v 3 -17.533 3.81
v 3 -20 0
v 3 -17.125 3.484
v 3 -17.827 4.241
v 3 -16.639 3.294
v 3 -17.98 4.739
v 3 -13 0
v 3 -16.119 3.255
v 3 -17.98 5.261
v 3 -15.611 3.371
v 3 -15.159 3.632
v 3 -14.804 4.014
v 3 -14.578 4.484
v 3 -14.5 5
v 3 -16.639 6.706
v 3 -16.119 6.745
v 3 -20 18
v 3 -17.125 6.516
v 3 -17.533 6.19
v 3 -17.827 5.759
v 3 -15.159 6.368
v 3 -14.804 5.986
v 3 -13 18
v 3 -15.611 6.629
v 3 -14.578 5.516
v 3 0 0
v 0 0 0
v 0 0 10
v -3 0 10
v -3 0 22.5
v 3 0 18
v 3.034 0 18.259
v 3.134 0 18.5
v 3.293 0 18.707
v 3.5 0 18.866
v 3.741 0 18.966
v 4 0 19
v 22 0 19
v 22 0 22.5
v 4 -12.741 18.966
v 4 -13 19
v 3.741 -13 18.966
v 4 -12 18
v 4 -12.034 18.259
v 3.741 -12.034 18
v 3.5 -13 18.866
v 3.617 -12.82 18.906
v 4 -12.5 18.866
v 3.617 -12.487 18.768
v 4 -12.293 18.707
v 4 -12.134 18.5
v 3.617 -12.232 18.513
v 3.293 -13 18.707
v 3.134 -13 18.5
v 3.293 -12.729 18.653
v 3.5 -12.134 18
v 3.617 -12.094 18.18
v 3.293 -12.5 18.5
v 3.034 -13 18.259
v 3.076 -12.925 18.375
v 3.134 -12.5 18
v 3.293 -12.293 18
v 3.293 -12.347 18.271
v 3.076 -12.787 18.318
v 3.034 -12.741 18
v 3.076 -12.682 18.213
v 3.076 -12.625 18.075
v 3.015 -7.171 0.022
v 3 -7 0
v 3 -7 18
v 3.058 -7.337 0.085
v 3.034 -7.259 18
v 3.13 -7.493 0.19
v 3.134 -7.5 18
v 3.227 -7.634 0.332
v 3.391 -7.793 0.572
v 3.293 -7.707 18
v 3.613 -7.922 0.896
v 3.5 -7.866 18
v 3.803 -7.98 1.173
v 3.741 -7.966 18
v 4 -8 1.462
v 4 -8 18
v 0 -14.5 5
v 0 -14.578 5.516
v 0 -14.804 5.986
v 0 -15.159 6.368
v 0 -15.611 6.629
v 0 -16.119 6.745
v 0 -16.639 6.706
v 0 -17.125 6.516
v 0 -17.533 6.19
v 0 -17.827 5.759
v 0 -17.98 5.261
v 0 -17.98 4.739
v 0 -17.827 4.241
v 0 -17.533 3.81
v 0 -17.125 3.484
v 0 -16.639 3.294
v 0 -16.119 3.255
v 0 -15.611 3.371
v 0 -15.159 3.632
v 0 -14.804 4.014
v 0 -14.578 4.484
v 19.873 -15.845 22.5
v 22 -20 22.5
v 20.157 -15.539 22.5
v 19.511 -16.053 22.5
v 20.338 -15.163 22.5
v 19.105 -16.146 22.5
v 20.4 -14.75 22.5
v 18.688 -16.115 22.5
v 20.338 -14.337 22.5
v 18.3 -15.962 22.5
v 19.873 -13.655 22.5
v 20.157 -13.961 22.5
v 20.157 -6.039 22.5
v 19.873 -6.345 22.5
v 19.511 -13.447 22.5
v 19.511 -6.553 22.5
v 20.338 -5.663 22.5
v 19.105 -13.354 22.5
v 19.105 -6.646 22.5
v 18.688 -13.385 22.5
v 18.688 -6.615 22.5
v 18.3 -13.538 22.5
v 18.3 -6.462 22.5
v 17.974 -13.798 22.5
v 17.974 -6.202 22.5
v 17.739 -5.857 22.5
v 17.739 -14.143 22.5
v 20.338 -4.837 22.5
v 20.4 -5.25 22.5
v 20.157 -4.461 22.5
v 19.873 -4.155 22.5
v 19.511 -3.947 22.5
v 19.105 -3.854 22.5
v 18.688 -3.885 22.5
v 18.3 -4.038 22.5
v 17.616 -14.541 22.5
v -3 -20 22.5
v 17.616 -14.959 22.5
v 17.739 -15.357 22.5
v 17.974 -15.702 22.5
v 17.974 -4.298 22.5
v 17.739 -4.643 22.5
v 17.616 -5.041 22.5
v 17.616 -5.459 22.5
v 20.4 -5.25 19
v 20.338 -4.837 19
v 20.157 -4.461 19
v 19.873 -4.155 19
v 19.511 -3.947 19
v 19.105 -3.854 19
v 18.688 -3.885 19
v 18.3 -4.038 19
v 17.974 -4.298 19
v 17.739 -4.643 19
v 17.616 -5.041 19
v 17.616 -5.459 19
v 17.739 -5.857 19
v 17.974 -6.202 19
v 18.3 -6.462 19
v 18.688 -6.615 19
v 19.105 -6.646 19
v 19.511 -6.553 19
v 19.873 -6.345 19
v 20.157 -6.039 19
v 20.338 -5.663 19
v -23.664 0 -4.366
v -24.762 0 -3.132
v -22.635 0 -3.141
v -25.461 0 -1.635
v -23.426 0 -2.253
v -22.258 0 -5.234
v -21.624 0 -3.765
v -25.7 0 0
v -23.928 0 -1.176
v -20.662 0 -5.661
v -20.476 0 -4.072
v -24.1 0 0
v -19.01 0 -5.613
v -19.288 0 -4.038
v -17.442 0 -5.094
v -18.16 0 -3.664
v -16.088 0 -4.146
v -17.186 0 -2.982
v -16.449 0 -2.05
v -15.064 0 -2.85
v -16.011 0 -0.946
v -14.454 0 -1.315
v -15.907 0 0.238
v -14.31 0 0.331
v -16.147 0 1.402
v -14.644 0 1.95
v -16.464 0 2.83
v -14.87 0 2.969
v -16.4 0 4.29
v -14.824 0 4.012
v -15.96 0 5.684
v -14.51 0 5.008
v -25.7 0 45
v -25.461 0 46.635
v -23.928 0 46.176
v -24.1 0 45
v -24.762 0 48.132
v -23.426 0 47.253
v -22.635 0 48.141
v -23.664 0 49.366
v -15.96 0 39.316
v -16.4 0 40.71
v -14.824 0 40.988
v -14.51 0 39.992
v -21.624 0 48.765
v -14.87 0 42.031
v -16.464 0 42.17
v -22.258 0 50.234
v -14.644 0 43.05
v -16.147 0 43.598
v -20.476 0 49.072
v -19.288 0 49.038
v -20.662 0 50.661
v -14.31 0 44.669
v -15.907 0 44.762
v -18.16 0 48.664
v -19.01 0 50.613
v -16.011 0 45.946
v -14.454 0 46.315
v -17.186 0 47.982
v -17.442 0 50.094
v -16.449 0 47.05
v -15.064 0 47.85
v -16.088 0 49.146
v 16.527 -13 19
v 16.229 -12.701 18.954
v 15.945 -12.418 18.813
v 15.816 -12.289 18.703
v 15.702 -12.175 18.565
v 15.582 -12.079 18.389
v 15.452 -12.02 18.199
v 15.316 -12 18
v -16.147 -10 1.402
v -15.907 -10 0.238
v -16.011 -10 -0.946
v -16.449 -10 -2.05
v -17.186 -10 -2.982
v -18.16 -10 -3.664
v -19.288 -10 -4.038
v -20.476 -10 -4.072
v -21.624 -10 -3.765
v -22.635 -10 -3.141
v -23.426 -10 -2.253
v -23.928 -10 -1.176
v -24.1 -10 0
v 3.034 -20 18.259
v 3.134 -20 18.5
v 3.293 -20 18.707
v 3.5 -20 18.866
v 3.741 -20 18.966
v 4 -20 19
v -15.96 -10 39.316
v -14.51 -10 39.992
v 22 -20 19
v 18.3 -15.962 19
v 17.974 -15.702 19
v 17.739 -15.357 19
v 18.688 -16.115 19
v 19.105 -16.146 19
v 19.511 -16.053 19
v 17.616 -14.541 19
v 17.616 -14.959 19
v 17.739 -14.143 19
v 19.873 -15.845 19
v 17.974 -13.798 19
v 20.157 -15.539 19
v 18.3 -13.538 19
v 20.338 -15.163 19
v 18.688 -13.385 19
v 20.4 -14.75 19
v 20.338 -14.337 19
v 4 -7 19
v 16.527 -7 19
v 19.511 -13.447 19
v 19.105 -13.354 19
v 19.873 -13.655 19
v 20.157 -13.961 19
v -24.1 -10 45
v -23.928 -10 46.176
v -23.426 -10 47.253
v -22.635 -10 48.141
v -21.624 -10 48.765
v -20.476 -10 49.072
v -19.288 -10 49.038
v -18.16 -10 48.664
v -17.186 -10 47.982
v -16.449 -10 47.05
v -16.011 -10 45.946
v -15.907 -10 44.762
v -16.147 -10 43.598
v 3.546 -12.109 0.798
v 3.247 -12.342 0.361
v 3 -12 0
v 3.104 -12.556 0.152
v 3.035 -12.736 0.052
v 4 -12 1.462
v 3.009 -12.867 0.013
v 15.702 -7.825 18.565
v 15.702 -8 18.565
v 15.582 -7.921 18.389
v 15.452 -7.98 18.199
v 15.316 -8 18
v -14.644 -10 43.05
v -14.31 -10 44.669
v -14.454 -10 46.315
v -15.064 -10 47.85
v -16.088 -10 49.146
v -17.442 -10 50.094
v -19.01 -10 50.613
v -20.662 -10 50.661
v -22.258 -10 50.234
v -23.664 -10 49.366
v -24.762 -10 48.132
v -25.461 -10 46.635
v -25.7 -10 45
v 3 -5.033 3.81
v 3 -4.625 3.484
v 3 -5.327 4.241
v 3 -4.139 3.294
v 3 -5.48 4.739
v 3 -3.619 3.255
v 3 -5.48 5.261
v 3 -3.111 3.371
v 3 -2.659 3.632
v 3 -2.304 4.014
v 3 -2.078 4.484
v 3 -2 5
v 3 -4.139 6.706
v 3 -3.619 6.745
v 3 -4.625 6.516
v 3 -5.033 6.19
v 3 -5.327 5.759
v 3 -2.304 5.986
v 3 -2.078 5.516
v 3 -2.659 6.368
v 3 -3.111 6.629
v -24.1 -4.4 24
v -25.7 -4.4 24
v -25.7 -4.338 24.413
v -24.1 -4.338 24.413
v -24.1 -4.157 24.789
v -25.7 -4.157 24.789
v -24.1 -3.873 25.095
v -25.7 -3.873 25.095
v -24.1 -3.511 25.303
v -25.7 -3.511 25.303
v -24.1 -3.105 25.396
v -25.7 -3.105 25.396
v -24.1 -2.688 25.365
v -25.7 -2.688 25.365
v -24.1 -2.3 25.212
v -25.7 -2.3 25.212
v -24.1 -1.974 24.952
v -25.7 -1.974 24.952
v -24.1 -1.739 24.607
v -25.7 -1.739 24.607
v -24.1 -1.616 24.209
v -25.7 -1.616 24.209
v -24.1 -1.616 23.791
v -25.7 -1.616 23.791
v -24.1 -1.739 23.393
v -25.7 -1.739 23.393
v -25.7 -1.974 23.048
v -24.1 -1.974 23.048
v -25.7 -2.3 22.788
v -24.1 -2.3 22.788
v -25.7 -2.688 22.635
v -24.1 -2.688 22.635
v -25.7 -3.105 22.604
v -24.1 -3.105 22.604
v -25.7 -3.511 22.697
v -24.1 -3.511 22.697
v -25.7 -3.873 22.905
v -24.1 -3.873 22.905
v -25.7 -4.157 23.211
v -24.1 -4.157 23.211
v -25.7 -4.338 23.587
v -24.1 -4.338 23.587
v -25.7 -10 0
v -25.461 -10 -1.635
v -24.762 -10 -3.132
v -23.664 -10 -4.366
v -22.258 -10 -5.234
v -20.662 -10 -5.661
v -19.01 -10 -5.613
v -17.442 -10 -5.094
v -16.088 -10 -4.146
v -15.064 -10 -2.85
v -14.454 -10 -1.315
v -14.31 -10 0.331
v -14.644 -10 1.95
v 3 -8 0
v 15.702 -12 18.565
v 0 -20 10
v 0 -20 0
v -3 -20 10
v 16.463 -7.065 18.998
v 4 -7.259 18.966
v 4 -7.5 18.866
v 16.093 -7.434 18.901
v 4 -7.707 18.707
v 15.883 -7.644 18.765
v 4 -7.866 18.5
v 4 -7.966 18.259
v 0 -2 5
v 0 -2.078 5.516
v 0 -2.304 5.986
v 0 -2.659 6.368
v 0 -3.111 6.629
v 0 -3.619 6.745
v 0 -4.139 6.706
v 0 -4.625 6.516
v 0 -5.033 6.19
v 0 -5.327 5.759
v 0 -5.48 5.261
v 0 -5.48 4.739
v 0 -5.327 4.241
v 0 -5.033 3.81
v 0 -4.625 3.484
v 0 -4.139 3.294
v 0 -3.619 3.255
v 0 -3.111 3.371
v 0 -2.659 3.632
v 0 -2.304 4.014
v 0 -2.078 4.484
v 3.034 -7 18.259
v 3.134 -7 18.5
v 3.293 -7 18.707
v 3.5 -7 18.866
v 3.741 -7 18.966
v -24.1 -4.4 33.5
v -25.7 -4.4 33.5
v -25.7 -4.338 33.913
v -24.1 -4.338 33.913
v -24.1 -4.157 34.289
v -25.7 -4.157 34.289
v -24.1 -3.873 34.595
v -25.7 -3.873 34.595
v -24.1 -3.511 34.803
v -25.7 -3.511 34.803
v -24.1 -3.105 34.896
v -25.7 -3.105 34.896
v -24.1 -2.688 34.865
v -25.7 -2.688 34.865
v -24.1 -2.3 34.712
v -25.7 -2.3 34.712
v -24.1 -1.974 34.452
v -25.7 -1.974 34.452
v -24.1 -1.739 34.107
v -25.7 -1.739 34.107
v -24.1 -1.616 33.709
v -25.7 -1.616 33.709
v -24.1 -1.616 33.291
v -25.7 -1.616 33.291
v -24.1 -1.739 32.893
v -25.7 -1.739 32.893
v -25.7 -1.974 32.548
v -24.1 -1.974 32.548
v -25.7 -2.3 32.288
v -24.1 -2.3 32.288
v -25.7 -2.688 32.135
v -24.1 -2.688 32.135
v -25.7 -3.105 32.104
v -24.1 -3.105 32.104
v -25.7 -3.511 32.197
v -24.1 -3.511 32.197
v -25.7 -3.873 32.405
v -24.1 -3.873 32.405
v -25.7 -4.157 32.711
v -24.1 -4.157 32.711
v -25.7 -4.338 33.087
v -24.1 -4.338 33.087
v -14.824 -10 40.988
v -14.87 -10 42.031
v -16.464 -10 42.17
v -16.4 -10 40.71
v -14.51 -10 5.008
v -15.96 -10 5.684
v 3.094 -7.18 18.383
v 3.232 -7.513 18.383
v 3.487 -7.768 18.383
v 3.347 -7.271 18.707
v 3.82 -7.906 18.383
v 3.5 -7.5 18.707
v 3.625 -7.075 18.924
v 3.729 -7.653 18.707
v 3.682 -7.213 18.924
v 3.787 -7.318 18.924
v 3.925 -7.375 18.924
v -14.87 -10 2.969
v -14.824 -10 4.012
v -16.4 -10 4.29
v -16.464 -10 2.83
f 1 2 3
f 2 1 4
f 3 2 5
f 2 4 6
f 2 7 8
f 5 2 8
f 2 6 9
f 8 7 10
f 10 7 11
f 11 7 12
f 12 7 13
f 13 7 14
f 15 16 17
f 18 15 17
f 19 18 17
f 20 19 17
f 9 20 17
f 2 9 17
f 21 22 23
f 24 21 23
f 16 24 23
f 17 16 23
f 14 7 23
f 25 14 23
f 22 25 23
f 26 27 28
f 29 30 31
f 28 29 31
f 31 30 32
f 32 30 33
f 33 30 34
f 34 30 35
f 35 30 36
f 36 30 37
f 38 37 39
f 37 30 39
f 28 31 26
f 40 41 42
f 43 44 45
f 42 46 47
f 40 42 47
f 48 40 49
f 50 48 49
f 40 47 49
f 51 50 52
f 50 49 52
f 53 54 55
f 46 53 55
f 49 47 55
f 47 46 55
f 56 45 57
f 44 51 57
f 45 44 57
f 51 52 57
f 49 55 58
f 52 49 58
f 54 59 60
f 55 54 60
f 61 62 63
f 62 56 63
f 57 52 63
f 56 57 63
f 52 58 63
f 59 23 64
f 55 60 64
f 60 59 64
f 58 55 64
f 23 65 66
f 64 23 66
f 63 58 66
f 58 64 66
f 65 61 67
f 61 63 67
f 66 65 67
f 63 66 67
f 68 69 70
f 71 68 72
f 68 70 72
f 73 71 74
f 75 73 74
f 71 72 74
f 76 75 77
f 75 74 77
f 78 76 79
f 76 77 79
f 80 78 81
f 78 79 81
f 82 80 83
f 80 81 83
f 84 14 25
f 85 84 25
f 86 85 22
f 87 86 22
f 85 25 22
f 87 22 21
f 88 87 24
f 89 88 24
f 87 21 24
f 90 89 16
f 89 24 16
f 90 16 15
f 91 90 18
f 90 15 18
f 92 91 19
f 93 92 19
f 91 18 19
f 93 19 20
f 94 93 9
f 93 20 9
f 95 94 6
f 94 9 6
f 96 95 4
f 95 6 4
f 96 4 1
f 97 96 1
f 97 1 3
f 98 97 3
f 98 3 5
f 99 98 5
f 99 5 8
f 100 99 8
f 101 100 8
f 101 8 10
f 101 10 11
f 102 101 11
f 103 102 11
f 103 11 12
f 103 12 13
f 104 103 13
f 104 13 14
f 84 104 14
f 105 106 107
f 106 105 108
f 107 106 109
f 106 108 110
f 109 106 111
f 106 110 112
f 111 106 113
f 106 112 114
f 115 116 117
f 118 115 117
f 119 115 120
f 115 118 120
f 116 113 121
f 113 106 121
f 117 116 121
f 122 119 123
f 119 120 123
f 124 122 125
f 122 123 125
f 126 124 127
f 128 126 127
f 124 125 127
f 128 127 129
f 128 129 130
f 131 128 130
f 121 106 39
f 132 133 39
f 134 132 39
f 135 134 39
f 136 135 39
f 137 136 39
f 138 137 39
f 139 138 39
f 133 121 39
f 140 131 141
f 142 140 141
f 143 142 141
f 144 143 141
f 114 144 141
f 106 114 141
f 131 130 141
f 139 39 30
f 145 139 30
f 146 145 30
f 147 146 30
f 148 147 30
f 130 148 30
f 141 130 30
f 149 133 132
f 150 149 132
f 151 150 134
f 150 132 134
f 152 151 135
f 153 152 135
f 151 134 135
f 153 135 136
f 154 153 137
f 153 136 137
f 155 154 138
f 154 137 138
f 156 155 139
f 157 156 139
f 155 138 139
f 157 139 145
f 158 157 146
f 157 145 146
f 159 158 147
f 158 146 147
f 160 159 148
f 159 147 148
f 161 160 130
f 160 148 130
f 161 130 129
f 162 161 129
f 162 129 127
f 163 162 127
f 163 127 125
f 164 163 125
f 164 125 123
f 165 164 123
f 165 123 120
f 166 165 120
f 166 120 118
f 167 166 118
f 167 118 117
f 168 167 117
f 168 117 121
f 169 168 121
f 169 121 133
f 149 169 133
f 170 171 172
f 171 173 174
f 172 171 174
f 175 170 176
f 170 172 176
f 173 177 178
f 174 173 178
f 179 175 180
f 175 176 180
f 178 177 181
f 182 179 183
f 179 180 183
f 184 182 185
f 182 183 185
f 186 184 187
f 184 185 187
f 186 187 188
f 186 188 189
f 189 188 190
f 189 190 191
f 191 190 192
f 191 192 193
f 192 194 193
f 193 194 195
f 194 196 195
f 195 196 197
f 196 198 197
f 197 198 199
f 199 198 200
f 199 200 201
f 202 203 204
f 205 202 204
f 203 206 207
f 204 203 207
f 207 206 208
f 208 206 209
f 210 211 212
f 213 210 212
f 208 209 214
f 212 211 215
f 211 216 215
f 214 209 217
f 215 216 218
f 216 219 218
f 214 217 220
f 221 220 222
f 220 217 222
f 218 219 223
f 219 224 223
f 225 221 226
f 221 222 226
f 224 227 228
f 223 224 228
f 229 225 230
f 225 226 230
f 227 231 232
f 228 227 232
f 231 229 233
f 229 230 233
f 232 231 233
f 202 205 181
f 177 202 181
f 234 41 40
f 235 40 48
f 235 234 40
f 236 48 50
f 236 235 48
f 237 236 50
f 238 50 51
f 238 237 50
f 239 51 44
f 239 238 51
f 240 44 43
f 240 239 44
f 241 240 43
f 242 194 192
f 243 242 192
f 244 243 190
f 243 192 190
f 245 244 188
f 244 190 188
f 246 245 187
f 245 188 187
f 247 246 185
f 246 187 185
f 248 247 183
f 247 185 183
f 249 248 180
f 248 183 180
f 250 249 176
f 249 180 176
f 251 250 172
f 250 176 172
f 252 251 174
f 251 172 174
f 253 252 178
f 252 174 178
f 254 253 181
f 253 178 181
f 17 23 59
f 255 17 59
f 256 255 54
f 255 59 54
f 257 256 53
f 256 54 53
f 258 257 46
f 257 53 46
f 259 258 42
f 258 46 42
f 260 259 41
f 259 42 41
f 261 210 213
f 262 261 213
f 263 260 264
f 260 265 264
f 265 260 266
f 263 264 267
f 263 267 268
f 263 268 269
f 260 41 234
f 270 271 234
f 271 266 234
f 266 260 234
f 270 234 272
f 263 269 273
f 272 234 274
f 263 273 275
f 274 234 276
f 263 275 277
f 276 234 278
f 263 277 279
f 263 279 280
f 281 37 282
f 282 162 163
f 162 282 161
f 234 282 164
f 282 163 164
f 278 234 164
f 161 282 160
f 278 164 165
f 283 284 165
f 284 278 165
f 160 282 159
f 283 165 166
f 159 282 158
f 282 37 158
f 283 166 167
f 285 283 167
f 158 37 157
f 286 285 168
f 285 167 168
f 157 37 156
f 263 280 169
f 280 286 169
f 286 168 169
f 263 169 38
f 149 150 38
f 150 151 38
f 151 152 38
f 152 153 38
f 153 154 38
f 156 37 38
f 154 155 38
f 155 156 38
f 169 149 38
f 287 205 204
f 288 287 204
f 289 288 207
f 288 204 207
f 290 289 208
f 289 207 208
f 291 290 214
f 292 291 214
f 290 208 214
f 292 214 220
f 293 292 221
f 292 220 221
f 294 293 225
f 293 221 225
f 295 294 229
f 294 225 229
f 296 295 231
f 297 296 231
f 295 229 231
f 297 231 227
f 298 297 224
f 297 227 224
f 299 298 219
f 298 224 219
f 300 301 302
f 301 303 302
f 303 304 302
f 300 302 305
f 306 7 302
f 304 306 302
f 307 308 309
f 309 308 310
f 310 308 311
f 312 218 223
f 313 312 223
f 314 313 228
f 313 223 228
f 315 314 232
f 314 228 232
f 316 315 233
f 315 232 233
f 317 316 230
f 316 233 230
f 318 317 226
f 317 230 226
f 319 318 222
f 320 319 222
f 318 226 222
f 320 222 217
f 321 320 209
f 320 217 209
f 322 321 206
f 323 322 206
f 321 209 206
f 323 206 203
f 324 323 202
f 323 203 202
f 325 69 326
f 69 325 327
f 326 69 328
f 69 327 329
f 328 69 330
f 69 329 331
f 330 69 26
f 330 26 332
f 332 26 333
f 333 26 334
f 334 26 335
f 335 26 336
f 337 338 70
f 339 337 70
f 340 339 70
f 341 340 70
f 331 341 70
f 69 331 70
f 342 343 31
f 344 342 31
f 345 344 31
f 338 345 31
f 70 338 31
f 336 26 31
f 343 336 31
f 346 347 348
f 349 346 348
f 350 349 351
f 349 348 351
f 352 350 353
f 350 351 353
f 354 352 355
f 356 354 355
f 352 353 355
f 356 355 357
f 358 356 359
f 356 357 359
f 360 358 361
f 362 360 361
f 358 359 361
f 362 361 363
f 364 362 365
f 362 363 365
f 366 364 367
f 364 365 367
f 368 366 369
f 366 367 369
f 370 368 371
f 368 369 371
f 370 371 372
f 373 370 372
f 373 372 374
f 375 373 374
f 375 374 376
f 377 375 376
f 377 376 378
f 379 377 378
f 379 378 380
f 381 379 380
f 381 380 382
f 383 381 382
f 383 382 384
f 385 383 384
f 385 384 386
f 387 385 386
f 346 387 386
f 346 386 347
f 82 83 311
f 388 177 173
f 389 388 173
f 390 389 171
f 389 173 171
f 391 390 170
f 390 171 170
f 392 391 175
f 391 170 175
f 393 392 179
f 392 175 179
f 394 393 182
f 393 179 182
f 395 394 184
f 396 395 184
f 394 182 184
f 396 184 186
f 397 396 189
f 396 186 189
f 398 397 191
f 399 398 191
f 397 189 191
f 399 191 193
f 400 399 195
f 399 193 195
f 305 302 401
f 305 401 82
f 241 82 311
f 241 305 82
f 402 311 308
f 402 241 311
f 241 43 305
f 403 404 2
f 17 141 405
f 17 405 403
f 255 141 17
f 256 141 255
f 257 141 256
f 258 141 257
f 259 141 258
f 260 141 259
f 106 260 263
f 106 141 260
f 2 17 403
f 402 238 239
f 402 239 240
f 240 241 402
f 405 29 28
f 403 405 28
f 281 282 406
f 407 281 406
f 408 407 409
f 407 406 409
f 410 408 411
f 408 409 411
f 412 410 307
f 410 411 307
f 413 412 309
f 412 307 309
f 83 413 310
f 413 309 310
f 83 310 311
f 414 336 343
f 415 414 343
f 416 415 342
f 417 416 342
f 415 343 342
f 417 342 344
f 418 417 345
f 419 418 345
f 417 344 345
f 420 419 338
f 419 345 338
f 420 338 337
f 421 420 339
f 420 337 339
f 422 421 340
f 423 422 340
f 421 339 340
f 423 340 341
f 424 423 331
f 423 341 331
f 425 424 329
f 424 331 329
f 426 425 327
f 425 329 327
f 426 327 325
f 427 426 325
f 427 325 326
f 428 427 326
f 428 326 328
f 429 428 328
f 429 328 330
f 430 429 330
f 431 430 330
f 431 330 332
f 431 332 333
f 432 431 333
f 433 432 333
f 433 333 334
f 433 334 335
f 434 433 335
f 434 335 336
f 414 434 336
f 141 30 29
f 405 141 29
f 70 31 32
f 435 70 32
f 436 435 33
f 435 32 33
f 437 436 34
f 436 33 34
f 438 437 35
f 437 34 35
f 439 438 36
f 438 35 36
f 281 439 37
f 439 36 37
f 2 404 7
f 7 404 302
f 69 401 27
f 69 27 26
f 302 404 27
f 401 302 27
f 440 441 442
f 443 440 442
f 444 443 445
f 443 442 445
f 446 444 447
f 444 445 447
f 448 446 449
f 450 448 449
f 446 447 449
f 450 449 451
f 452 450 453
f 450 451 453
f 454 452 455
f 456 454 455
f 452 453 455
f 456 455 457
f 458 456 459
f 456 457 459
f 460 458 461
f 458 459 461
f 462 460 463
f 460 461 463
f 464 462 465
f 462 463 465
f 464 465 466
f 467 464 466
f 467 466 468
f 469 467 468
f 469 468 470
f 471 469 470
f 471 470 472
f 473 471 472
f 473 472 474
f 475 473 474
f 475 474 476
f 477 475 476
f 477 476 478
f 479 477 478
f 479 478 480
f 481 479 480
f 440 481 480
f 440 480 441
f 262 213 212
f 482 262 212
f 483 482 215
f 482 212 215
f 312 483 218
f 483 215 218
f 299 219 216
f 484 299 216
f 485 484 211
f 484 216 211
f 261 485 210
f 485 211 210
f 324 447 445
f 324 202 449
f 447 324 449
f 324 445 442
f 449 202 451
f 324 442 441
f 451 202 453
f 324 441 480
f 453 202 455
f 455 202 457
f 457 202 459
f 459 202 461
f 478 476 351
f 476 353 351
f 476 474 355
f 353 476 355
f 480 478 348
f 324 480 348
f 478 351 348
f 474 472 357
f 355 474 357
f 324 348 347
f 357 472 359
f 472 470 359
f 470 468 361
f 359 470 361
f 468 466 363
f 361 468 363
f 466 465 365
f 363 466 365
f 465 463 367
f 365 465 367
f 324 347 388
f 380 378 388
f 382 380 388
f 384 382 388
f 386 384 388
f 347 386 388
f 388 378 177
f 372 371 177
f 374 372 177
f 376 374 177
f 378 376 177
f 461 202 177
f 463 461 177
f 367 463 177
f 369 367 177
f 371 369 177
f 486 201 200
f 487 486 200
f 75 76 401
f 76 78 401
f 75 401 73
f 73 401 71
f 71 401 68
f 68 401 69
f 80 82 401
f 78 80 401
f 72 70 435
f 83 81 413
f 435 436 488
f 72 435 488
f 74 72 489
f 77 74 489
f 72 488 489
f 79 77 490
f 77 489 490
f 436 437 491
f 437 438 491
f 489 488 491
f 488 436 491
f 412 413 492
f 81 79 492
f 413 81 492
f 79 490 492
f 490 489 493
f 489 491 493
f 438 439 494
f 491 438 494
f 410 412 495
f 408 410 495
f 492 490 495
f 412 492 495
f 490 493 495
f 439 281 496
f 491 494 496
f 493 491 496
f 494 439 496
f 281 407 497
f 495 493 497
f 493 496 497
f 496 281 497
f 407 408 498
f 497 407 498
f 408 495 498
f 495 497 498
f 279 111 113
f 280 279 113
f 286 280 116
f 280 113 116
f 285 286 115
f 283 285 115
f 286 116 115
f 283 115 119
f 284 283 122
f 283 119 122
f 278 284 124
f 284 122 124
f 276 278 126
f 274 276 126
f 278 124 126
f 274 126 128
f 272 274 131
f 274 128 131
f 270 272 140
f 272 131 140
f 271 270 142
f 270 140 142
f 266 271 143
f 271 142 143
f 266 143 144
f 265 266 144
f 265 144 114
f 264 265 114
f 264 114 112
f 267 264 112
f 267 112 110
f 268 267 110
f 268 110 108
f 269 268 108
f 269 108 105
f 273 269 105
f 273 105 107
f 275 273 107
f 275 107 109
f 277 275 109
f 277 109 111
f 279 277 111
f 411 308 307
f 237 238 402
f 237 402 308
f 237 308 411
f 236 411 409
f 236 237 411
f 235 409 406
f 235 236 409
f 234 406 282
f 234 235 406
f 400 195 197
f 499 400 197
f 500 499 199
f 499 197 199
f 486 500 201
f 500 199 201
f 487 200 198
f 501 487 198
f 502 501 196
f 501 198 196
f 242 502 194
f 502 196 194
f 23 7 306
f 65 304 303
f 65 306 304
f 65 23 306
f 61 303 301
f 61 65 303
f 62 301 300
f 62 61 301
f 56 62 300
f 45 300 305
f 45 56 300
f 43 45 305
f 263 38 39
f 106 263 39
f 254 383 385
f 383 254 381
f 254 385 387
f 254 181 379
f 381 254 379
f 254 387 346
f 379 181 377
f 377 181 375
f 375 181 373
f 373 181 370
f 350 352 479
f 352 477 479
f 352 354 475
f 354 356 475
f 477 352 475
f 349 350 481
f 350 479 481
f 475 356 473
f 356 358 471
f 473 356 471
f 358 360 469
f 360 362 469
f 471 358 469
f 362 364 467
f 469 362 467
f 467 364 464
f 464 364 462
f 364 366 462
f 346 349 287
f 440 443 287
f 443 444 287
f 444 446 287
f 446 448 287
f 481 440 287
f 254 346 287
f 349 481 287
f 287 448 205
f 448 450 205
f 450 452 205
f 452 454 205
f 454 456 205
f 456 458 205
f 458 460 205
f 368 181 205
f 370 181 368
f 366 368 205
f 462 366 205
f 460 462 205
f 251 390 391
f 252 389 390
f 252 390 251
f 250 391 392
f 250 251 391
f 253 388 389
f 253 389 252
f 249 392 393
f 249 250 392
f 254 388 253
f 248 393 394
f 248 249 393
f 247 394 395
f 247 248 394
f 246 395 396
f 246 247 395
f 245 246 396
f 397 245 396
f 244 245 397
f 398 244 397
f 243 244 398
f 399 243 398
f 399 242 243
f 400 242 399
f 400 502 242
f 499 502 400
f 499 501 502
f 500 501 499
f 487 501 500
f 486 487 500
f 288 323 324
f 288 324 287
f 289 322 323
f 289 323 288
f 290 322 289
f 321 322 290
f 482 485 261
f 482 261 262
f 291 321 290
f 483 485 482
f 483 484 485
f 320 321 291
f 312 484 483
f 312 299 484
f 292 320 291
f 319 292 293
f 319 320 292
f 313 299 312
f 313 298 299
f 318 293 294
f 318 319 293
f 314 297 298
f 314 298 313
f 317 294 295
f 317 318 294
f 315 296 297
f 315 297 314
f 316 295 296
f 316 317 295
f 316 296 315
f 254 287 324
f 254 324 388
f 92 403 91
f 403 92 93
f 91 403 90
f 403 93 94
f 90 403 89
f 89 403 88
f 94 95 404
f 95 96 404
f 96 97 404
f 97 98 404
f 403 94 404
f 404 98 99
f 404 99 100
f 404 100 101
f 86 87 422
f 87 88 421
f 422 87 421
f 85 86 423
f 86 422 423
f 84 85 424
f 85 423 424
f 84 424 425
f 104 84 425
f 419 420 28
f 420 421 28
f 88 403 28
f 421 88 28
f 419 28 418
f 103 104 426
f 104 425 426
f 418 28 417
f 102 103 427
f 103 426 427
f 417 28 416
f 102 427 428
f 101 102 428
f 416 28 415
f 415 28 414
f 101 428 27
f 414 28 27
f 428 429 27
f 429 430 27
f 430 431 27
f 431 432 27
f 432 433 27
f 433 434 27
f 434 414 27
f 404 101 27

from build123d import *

# Parameters (mm, degrees)
F1_DEPTH      = 10
F2_R          = 1.4
F3_DEPTH      = 11.401
F5_DEPTH      = 20
F6_R          = 1.4
F7_DEPTH      = 28.201
F11_DEPTH     = 2
F12_T1_DEPTH  = 7
F12_T3_DEPTH  = 7
F12_T5_DEPTH  = 4
F12_S9_W      = 1
F12_S9_H      = 1
F12_T10_DEPTH = 1
F12_S15_W     = 1
F12_S15_H     = 1
F12_T16_DEPTH = 1
F12_T22_DEPTH = 14.5
F12_T27_DEPTH = 18
F12_T32_DEPTH = 14.5
F12_T37_DEPTH = 18
F12_T43_DEPTH = 5.3186485351
F12_T47_DEPTH = 14.5
F12_T54_DEPTH = 5.3186485351
F12_T58_DEPTH = 14.5
F13_R         = 1.75
F14_DEPTH     = 28.701


# Not quite as in the source:
# - a fillet or chamfer that OpenCascade refuses, or shapes differently, is made with other operations: its cross-section is extruded or revolved along the edge and cut away or added


with BuildPart() as f1:
    # F0 (on Front) → F1 (new body)
    with BuildSketch(Plane.XZ):
        with BuildLine():
            ThreePointArc((-14.6437520615, 43.050485183), (-19.0102053873, 50.6134041922), (-25.7, 45))
            Line((-25.7, 45), (-25.7, 0))
            ThreePointArc((-25.7, 0), (-19.0102053873, -5.6134041922), (-14.6437520615, 1.949514817))
            ThreePointArc((-14.6437520615, 1.949514817), (-14.8811744647, 3.4920729397), (-14.5102127265, 5.0080684372))
            Line((-14.5102127265, 5.0080684372), (-15.9603051858, 5.684257656))
            ThreePointArc((-15.9603051858, 5.684257656), (-16.4796516192, 3.5618639595), (-16.1472602548, 1.4022825876))
            ThreePointArc((-16.1472602548, 1.4022825876), (-19.2880424716, -4.0377117874), (-24.1, 0))
            Line((-24.1, 0), (-24.1, 45))
            ThreePointArc((-24.1, 45), (-19.2880424716, 49.0377117874), (-16.1472602548, 43.5977174124))
            ThreePointArc((-16.1472602548, 43.5977174124), (-16.4796516192, 41.4381360405), (-15.9603051858, 39.315742344))
            Line((-15.9603051858, 39.315742344), (-14.5102127265, 39.9919315628))
            ThreePointArc((-14.5102127265, 39.9919315628), (-14.8811744647, 41.5079270603), (-14.6437520615, 43.050485183))
        make_face()
    extrude(amount=F1_DEPTH)

    # F2 (on face) → F3 (cut, through all)
    with BuildSketch(Plane(origin=(-25.7, 0, 0), x_dir=(0, -1, 0), z_dir=(-1, 0, 0))):
        with Locations((3, 33.5)):
            Circle(F2_R)
        with Locations((3, 24)):
            Circle(F2_R)
    extrude(amount=-F3_DEPTH, mode=Mode.SUBTRACT)


with BuildPart() as f5:
    # F4 (on Front) → F5 (new body)
    with BuildSketch(Plane.XZ):
        Polygon((0, 10), (0, 0), (3, 0), (3, 19), (22, 19), (22, 22.5), (-3, 22.5), (-3, 10), align=None)
    extrude(amount=F5_DEPTH)

    # F6 (on face) → F7 (cut, through all)
    with BuildSketch(Plane.XY.offset(22.5)):
        with Locations((19, -5.25)):
            Circle(F6_R)
        with Locations((19, -14.75)):
            Circle(F6_R)
    extrude(amount=-F7_DEPTH, mode=Mode.SUBTRACT)

    # F10 (on plane+point) → F11 (join, symmetric)
    with BuildSketch(Plane.XZ.offset(10)):
        Polygon((3, 19), (3, 0), (16, 19), align=None)
    extrude(amount=F11_DEPTH, both=True)

    # F12: fillet of radius 1 on 7 edges, made by hand

    # F12_s2 → F12_t1 (join)
    with BuildSketch(Plane.XZ.offset(13)):
        with BuildLine():
            ThreePointArc((3, 18), (3.2928932188, 18.7071067812), (4, 19))
            Line((4, 19), (3, 19))
            Line((3, 19), (3, 18))
        make_face()
    extrude(amount=F12_T1_DEPTH)

    # F12_s4 → F12_t3 (join)
    with BuildSketch(Plane.XZ):
        with BuildLine():
            ThreePointArc((3, 18), (3.2928932188, 18.7071067812), (4, 19))
            Line((4, 19), (3, 19))
            Line((3, 19), (3, 18))
        make_face()
    extrude(amount=F12_T3_DEPTH)

    # F12_s6 → F12_t5 (join)
    with BuildSketch(Plane.XZ.offset(8)):
        with BuildLine():
            ThreePointArc((15.7021521528, 18.5646839156), (16.0609210531, 18.8845009654), (16.527459414, 19))
            Line((16.527459414, 19), (16, 19))
            Line((16, 19), (15.7021521528, 18.5646839156))
        make_face()
    extrude(amount=F12_T5_DEPTH)


with BuildPart() as f12_tool8:
    # F12_s9 → F12_t10 (new body)
    with BuildSketch(Plane.YZ.offset(4)):
        with Locations((-12.5, 18.5)):
            Rectangle(F12_S9_W, F12_S9_H)
    extrude(amount=-F12_T10_DEPTH)

    # F12_s11 → F12_t12 (revolve, cut)
    with BuildSketch(Plane(origin=(4, -13, 18), x_dir=(0, -0.7071067812, -0.7071067812), z_dir=(0, 0.7071067812, -0.7071067812))):
        with BuildLine():
            ThreePointArc((0, -1), (1, 0), (0, 1))
            Line((0, 1), (0, -1))
        make_face()
    revolve(axis=Axis((4, -13, 18), (-1, 0, 0)), mode=Mode.SUBTRACT)


with BuildPart() as f5_1:
    add(f5.part)

    # F12_t7: union F12_tool8
    add(f12_tool8.part)


with BuildPart() as f12_tool14:
    # F12_s15 → F12_t16 (new body)
    with BuildSketch(Plane.XY.offset(18)):
        with Locations((3.5, -7.5)):
            Rectangle(F12_S15_W, F12_S15_H)
    extrude(amount=F12_T16_DEPTH)

    # F12_s17 → F12_t18 (revolve, cut)
    with BuildSketch(Plane(origin=(4, -7, 18), x_dir=(0.7071067812, 0.7071067812, 0), z_dir=(0.7071067812, -0.7071067812, 0))):
        with BuildLine():
            ThreePointArc((0, -1), (1, 0), (0, 1))
            Line((0, 1), (0, -1))
        make_face()
    revolve(axis=Axis((4, -7, 18), (0, 0, 1)), mode=Mode.SUBTRACT)


with BuildPart() as f5_2:
    add(f5_1.part)

    # F12_t13: union F12_tool14
    add(f12_tool14.part)


with BuildPart() as f12_tool20:
    # F12_s21 → F12_t22 (new body)
    with BuildSketch(Plane.YZ.offset(18.5)):
        with BuildLine():
            ThreePointArc((-13, 19), (-12.2928932188, 18.7071067812), (-12, 18))
            Line((-12, 18), (-12, 19))
            Line((-12, 19), (-13, 19))
        make_face()
    extrude(amount=-F12_T22_DEPTH)

    split(bisect_by=Plane(origin=(2.0433962264, 0, -1.3981132075), x_dir=(0, 1, 0), z_dir=(-0.8253072612, 0, 0.5646839156)), keep=Keep.TOP)


with BuildPart() as f5_3:
    add(f5_2.part)

    # F12_t19: union F12_tool20
    add(f12_tool20.part)


with BuildPart() as f12_tool25:
    # F12_s26 → F12_t27 (new body)
    with BuildSketch(Plane.XY.offset(18)):
        with BuildLine():
            ThreePointArc((3, -13), (3.2928932188, -12.2928932188), (4, -12))
            Line((4, -12), (3, -12))
            Line((3, -12), (3, -13))
        make_face()
    extrude(amount=-F12_T27_DEPTH)

    split(bisect_by=Plane(origin=(2.0433962264, 0, -1.3981132075), x_dir=(0, 1, 0), z_dir=(-0.8253072612, 0, 0.5646839156)), keep=Keep.TOP)


with BuildPart() as f5_4:
    add(f5_3.part)

    # F12_t24: union F12_tool25
    add(f12_tool25.part)


with BuildPart() as f12_tool30:
    # F12_s31 → F12_t32 (new body)
    with BuildSketch(Plane.YZ.offset(18.5)):
        with BuildLine():
            ThreePointArc((-7, 19), (-7.7071067812, 18.7071067812), (-8, 18))
            Line((-8, 18), (-8, 19))
            Line((-8, 19), (-7, 19))
        make_face()
    extrude(amount=-F12_T32_DEPTH)

    split(bisect_by=Plane(origin=(2.0433962264, 0, -1.3981132075), x_dir=(0, 1, 0), z_dir=(-0.8253072612, 0, 0.5646839156)), keep=Keep.TOP)


with BuildPart() as f5_5:
    add(f5_4.part)

    # F12_t29: union F12_tool30
    add(f12_tool30.part)


with BuildPart() as f12_tool35:
    # F12_s36 → F12_t37 (new body)
    with BuildSketch(Plane.XY.offset(18)):
        with BuildLine():
            ThreePointArc((3, -7), (3.2928932188, -7.7071067812), (4, -8))
            Line((4, -8), (3, -8))
            Line((3, -8), (3, -7))
        make_face()
    extrude(amount=-F12_T37_DEPTH)

    split(bisect_by=Plane(origin=(2.0433962264, 0, -1.3981132075), x_dir=(0, 1, 0), z_dir=(-0.8253072612, 0, 0.5646839156)), keep=Keep.TOP)


with BuildPart() as f5_6:
    add(f5_5.part)

    # F12_t34: union F12_tool35
    add(f12_tool35.part)


with BuildPart() as f12_tool41:
    # F12_s42 → F12_t43 (new body)
    with BuildSketch(Plane.XZ.offset(13.3186485351)):
        with BuildLine():
            ThreePointArc((15.7021521528, 18.5646839156), (16.0609210531, 18.8845009654), (16.527459414, 19))
            Line((16.527459414, 19), (16, 19))
            Line((16, 19), (15.7021521528, 18.5646839156))
        make_face()
    extrude(amount=-F12_T43_DEPTH)

    split(bisect_by=Plane.XZ.offset(12), keep=Keep.TOP)


with BuildPart() as f12_tool45:
    # F12_s46 → F12_t47 (new body)
    with BuildSketch(Plane.YZ.offset(18.5)):
        with BuildLine():
            ThreePointArc((-13, 19), (-12.2928932188, 18.7071067812), (-12, 18))
            Line((-12, 18), (-12, 19))
            Line((-12, 19), (-13, 19))
        make_face()
    extrude(amount=-F12_T47_DEPTH)

    split(bisect_by=Plane(origin=(2.0433962264, 0, -1.3981132075), x_dir=(0, 1, 0), z_dir=(0.8253072612, 0, -0.5646839156)), keep=Keep.TOP)


with BuildPart() as f12_tool41_1:
    add(f12_tool41.part)

    # F12_t49: intersect F12_tool45
    add(f12_tool45.part, mode=Mode.INTERSECT)


with BuildPart() as f5_7:
    add(f5_6.part)

    # F12_t39: union F12_tool41
    add(f12_tool41_1.part)


with BuildPart() as f12_tool52:
    # F12_s53 → F12_t54 (new body)
    with BuildSketch(Plane.XZ.offset(12)):
        with BuildLine():
            ThreePointArc((15.7021521528, 18.5646839156), (16.0609210531, 18.8845009654), (16.527459414, 19))
            Line((16.527459414, 19), (16, 19))
            Line((16, 19), (15.7021521528, 18.5646839156))
        make_face()
    extrude(amount=-F12_T54_DEPTH)

    split(bisect_by=Plane.XZ.offset(8), keep=Keep.BOTTOM)


with BuildPart() as f12_tool56:
    # F12_s57 → F12_t58 (new body)
    with BuildSketch(Plane.YZ.offset(18.5)):
        with BuildLine():
            ThreePointArc((-7, 19), (-7.7071067812, 18.7071067812), (-8, 18))
            Line((-8, 18), (-8, 19))
            Line((-8, 19), (-7, 19))
        make_face()
    extrude(amount=-F12_T58_DEPTH)

    split(bisect_by=Plane(origin=(2.0433962264, 0, -1.3981132075), x_dir=(0, 1, 0), z_dir=(0.8253072612, 0, -0.5646839156)), keep=Keep.TOP)


with BuildPart() as f12_tool52_1:
    add(f12_tool52.part)

    # F12_t60: intersect F12_tool56
    add(f12_tool56.part, mode=Mode.INTERSECT)


with BuildPart() as f5_8:
    add(f5_7.part)

    # F12_t50: union F12_tool52
    add(f12_tool52_1.part)

    # F13 (on face) → F14 (cut, through all)
    with BuildSketch(Plane.YZ.offset(3)):
        with Locations((-16.25, 5)):
            Circle(F13_R)
        with Locations((-3.75, 5)):
            Circle(F13_R)
    extrude(amount=-F14_DEPTH, mode=Mode.SUBTRACT)


solid = Compound([f1.part, f5_8.part])
